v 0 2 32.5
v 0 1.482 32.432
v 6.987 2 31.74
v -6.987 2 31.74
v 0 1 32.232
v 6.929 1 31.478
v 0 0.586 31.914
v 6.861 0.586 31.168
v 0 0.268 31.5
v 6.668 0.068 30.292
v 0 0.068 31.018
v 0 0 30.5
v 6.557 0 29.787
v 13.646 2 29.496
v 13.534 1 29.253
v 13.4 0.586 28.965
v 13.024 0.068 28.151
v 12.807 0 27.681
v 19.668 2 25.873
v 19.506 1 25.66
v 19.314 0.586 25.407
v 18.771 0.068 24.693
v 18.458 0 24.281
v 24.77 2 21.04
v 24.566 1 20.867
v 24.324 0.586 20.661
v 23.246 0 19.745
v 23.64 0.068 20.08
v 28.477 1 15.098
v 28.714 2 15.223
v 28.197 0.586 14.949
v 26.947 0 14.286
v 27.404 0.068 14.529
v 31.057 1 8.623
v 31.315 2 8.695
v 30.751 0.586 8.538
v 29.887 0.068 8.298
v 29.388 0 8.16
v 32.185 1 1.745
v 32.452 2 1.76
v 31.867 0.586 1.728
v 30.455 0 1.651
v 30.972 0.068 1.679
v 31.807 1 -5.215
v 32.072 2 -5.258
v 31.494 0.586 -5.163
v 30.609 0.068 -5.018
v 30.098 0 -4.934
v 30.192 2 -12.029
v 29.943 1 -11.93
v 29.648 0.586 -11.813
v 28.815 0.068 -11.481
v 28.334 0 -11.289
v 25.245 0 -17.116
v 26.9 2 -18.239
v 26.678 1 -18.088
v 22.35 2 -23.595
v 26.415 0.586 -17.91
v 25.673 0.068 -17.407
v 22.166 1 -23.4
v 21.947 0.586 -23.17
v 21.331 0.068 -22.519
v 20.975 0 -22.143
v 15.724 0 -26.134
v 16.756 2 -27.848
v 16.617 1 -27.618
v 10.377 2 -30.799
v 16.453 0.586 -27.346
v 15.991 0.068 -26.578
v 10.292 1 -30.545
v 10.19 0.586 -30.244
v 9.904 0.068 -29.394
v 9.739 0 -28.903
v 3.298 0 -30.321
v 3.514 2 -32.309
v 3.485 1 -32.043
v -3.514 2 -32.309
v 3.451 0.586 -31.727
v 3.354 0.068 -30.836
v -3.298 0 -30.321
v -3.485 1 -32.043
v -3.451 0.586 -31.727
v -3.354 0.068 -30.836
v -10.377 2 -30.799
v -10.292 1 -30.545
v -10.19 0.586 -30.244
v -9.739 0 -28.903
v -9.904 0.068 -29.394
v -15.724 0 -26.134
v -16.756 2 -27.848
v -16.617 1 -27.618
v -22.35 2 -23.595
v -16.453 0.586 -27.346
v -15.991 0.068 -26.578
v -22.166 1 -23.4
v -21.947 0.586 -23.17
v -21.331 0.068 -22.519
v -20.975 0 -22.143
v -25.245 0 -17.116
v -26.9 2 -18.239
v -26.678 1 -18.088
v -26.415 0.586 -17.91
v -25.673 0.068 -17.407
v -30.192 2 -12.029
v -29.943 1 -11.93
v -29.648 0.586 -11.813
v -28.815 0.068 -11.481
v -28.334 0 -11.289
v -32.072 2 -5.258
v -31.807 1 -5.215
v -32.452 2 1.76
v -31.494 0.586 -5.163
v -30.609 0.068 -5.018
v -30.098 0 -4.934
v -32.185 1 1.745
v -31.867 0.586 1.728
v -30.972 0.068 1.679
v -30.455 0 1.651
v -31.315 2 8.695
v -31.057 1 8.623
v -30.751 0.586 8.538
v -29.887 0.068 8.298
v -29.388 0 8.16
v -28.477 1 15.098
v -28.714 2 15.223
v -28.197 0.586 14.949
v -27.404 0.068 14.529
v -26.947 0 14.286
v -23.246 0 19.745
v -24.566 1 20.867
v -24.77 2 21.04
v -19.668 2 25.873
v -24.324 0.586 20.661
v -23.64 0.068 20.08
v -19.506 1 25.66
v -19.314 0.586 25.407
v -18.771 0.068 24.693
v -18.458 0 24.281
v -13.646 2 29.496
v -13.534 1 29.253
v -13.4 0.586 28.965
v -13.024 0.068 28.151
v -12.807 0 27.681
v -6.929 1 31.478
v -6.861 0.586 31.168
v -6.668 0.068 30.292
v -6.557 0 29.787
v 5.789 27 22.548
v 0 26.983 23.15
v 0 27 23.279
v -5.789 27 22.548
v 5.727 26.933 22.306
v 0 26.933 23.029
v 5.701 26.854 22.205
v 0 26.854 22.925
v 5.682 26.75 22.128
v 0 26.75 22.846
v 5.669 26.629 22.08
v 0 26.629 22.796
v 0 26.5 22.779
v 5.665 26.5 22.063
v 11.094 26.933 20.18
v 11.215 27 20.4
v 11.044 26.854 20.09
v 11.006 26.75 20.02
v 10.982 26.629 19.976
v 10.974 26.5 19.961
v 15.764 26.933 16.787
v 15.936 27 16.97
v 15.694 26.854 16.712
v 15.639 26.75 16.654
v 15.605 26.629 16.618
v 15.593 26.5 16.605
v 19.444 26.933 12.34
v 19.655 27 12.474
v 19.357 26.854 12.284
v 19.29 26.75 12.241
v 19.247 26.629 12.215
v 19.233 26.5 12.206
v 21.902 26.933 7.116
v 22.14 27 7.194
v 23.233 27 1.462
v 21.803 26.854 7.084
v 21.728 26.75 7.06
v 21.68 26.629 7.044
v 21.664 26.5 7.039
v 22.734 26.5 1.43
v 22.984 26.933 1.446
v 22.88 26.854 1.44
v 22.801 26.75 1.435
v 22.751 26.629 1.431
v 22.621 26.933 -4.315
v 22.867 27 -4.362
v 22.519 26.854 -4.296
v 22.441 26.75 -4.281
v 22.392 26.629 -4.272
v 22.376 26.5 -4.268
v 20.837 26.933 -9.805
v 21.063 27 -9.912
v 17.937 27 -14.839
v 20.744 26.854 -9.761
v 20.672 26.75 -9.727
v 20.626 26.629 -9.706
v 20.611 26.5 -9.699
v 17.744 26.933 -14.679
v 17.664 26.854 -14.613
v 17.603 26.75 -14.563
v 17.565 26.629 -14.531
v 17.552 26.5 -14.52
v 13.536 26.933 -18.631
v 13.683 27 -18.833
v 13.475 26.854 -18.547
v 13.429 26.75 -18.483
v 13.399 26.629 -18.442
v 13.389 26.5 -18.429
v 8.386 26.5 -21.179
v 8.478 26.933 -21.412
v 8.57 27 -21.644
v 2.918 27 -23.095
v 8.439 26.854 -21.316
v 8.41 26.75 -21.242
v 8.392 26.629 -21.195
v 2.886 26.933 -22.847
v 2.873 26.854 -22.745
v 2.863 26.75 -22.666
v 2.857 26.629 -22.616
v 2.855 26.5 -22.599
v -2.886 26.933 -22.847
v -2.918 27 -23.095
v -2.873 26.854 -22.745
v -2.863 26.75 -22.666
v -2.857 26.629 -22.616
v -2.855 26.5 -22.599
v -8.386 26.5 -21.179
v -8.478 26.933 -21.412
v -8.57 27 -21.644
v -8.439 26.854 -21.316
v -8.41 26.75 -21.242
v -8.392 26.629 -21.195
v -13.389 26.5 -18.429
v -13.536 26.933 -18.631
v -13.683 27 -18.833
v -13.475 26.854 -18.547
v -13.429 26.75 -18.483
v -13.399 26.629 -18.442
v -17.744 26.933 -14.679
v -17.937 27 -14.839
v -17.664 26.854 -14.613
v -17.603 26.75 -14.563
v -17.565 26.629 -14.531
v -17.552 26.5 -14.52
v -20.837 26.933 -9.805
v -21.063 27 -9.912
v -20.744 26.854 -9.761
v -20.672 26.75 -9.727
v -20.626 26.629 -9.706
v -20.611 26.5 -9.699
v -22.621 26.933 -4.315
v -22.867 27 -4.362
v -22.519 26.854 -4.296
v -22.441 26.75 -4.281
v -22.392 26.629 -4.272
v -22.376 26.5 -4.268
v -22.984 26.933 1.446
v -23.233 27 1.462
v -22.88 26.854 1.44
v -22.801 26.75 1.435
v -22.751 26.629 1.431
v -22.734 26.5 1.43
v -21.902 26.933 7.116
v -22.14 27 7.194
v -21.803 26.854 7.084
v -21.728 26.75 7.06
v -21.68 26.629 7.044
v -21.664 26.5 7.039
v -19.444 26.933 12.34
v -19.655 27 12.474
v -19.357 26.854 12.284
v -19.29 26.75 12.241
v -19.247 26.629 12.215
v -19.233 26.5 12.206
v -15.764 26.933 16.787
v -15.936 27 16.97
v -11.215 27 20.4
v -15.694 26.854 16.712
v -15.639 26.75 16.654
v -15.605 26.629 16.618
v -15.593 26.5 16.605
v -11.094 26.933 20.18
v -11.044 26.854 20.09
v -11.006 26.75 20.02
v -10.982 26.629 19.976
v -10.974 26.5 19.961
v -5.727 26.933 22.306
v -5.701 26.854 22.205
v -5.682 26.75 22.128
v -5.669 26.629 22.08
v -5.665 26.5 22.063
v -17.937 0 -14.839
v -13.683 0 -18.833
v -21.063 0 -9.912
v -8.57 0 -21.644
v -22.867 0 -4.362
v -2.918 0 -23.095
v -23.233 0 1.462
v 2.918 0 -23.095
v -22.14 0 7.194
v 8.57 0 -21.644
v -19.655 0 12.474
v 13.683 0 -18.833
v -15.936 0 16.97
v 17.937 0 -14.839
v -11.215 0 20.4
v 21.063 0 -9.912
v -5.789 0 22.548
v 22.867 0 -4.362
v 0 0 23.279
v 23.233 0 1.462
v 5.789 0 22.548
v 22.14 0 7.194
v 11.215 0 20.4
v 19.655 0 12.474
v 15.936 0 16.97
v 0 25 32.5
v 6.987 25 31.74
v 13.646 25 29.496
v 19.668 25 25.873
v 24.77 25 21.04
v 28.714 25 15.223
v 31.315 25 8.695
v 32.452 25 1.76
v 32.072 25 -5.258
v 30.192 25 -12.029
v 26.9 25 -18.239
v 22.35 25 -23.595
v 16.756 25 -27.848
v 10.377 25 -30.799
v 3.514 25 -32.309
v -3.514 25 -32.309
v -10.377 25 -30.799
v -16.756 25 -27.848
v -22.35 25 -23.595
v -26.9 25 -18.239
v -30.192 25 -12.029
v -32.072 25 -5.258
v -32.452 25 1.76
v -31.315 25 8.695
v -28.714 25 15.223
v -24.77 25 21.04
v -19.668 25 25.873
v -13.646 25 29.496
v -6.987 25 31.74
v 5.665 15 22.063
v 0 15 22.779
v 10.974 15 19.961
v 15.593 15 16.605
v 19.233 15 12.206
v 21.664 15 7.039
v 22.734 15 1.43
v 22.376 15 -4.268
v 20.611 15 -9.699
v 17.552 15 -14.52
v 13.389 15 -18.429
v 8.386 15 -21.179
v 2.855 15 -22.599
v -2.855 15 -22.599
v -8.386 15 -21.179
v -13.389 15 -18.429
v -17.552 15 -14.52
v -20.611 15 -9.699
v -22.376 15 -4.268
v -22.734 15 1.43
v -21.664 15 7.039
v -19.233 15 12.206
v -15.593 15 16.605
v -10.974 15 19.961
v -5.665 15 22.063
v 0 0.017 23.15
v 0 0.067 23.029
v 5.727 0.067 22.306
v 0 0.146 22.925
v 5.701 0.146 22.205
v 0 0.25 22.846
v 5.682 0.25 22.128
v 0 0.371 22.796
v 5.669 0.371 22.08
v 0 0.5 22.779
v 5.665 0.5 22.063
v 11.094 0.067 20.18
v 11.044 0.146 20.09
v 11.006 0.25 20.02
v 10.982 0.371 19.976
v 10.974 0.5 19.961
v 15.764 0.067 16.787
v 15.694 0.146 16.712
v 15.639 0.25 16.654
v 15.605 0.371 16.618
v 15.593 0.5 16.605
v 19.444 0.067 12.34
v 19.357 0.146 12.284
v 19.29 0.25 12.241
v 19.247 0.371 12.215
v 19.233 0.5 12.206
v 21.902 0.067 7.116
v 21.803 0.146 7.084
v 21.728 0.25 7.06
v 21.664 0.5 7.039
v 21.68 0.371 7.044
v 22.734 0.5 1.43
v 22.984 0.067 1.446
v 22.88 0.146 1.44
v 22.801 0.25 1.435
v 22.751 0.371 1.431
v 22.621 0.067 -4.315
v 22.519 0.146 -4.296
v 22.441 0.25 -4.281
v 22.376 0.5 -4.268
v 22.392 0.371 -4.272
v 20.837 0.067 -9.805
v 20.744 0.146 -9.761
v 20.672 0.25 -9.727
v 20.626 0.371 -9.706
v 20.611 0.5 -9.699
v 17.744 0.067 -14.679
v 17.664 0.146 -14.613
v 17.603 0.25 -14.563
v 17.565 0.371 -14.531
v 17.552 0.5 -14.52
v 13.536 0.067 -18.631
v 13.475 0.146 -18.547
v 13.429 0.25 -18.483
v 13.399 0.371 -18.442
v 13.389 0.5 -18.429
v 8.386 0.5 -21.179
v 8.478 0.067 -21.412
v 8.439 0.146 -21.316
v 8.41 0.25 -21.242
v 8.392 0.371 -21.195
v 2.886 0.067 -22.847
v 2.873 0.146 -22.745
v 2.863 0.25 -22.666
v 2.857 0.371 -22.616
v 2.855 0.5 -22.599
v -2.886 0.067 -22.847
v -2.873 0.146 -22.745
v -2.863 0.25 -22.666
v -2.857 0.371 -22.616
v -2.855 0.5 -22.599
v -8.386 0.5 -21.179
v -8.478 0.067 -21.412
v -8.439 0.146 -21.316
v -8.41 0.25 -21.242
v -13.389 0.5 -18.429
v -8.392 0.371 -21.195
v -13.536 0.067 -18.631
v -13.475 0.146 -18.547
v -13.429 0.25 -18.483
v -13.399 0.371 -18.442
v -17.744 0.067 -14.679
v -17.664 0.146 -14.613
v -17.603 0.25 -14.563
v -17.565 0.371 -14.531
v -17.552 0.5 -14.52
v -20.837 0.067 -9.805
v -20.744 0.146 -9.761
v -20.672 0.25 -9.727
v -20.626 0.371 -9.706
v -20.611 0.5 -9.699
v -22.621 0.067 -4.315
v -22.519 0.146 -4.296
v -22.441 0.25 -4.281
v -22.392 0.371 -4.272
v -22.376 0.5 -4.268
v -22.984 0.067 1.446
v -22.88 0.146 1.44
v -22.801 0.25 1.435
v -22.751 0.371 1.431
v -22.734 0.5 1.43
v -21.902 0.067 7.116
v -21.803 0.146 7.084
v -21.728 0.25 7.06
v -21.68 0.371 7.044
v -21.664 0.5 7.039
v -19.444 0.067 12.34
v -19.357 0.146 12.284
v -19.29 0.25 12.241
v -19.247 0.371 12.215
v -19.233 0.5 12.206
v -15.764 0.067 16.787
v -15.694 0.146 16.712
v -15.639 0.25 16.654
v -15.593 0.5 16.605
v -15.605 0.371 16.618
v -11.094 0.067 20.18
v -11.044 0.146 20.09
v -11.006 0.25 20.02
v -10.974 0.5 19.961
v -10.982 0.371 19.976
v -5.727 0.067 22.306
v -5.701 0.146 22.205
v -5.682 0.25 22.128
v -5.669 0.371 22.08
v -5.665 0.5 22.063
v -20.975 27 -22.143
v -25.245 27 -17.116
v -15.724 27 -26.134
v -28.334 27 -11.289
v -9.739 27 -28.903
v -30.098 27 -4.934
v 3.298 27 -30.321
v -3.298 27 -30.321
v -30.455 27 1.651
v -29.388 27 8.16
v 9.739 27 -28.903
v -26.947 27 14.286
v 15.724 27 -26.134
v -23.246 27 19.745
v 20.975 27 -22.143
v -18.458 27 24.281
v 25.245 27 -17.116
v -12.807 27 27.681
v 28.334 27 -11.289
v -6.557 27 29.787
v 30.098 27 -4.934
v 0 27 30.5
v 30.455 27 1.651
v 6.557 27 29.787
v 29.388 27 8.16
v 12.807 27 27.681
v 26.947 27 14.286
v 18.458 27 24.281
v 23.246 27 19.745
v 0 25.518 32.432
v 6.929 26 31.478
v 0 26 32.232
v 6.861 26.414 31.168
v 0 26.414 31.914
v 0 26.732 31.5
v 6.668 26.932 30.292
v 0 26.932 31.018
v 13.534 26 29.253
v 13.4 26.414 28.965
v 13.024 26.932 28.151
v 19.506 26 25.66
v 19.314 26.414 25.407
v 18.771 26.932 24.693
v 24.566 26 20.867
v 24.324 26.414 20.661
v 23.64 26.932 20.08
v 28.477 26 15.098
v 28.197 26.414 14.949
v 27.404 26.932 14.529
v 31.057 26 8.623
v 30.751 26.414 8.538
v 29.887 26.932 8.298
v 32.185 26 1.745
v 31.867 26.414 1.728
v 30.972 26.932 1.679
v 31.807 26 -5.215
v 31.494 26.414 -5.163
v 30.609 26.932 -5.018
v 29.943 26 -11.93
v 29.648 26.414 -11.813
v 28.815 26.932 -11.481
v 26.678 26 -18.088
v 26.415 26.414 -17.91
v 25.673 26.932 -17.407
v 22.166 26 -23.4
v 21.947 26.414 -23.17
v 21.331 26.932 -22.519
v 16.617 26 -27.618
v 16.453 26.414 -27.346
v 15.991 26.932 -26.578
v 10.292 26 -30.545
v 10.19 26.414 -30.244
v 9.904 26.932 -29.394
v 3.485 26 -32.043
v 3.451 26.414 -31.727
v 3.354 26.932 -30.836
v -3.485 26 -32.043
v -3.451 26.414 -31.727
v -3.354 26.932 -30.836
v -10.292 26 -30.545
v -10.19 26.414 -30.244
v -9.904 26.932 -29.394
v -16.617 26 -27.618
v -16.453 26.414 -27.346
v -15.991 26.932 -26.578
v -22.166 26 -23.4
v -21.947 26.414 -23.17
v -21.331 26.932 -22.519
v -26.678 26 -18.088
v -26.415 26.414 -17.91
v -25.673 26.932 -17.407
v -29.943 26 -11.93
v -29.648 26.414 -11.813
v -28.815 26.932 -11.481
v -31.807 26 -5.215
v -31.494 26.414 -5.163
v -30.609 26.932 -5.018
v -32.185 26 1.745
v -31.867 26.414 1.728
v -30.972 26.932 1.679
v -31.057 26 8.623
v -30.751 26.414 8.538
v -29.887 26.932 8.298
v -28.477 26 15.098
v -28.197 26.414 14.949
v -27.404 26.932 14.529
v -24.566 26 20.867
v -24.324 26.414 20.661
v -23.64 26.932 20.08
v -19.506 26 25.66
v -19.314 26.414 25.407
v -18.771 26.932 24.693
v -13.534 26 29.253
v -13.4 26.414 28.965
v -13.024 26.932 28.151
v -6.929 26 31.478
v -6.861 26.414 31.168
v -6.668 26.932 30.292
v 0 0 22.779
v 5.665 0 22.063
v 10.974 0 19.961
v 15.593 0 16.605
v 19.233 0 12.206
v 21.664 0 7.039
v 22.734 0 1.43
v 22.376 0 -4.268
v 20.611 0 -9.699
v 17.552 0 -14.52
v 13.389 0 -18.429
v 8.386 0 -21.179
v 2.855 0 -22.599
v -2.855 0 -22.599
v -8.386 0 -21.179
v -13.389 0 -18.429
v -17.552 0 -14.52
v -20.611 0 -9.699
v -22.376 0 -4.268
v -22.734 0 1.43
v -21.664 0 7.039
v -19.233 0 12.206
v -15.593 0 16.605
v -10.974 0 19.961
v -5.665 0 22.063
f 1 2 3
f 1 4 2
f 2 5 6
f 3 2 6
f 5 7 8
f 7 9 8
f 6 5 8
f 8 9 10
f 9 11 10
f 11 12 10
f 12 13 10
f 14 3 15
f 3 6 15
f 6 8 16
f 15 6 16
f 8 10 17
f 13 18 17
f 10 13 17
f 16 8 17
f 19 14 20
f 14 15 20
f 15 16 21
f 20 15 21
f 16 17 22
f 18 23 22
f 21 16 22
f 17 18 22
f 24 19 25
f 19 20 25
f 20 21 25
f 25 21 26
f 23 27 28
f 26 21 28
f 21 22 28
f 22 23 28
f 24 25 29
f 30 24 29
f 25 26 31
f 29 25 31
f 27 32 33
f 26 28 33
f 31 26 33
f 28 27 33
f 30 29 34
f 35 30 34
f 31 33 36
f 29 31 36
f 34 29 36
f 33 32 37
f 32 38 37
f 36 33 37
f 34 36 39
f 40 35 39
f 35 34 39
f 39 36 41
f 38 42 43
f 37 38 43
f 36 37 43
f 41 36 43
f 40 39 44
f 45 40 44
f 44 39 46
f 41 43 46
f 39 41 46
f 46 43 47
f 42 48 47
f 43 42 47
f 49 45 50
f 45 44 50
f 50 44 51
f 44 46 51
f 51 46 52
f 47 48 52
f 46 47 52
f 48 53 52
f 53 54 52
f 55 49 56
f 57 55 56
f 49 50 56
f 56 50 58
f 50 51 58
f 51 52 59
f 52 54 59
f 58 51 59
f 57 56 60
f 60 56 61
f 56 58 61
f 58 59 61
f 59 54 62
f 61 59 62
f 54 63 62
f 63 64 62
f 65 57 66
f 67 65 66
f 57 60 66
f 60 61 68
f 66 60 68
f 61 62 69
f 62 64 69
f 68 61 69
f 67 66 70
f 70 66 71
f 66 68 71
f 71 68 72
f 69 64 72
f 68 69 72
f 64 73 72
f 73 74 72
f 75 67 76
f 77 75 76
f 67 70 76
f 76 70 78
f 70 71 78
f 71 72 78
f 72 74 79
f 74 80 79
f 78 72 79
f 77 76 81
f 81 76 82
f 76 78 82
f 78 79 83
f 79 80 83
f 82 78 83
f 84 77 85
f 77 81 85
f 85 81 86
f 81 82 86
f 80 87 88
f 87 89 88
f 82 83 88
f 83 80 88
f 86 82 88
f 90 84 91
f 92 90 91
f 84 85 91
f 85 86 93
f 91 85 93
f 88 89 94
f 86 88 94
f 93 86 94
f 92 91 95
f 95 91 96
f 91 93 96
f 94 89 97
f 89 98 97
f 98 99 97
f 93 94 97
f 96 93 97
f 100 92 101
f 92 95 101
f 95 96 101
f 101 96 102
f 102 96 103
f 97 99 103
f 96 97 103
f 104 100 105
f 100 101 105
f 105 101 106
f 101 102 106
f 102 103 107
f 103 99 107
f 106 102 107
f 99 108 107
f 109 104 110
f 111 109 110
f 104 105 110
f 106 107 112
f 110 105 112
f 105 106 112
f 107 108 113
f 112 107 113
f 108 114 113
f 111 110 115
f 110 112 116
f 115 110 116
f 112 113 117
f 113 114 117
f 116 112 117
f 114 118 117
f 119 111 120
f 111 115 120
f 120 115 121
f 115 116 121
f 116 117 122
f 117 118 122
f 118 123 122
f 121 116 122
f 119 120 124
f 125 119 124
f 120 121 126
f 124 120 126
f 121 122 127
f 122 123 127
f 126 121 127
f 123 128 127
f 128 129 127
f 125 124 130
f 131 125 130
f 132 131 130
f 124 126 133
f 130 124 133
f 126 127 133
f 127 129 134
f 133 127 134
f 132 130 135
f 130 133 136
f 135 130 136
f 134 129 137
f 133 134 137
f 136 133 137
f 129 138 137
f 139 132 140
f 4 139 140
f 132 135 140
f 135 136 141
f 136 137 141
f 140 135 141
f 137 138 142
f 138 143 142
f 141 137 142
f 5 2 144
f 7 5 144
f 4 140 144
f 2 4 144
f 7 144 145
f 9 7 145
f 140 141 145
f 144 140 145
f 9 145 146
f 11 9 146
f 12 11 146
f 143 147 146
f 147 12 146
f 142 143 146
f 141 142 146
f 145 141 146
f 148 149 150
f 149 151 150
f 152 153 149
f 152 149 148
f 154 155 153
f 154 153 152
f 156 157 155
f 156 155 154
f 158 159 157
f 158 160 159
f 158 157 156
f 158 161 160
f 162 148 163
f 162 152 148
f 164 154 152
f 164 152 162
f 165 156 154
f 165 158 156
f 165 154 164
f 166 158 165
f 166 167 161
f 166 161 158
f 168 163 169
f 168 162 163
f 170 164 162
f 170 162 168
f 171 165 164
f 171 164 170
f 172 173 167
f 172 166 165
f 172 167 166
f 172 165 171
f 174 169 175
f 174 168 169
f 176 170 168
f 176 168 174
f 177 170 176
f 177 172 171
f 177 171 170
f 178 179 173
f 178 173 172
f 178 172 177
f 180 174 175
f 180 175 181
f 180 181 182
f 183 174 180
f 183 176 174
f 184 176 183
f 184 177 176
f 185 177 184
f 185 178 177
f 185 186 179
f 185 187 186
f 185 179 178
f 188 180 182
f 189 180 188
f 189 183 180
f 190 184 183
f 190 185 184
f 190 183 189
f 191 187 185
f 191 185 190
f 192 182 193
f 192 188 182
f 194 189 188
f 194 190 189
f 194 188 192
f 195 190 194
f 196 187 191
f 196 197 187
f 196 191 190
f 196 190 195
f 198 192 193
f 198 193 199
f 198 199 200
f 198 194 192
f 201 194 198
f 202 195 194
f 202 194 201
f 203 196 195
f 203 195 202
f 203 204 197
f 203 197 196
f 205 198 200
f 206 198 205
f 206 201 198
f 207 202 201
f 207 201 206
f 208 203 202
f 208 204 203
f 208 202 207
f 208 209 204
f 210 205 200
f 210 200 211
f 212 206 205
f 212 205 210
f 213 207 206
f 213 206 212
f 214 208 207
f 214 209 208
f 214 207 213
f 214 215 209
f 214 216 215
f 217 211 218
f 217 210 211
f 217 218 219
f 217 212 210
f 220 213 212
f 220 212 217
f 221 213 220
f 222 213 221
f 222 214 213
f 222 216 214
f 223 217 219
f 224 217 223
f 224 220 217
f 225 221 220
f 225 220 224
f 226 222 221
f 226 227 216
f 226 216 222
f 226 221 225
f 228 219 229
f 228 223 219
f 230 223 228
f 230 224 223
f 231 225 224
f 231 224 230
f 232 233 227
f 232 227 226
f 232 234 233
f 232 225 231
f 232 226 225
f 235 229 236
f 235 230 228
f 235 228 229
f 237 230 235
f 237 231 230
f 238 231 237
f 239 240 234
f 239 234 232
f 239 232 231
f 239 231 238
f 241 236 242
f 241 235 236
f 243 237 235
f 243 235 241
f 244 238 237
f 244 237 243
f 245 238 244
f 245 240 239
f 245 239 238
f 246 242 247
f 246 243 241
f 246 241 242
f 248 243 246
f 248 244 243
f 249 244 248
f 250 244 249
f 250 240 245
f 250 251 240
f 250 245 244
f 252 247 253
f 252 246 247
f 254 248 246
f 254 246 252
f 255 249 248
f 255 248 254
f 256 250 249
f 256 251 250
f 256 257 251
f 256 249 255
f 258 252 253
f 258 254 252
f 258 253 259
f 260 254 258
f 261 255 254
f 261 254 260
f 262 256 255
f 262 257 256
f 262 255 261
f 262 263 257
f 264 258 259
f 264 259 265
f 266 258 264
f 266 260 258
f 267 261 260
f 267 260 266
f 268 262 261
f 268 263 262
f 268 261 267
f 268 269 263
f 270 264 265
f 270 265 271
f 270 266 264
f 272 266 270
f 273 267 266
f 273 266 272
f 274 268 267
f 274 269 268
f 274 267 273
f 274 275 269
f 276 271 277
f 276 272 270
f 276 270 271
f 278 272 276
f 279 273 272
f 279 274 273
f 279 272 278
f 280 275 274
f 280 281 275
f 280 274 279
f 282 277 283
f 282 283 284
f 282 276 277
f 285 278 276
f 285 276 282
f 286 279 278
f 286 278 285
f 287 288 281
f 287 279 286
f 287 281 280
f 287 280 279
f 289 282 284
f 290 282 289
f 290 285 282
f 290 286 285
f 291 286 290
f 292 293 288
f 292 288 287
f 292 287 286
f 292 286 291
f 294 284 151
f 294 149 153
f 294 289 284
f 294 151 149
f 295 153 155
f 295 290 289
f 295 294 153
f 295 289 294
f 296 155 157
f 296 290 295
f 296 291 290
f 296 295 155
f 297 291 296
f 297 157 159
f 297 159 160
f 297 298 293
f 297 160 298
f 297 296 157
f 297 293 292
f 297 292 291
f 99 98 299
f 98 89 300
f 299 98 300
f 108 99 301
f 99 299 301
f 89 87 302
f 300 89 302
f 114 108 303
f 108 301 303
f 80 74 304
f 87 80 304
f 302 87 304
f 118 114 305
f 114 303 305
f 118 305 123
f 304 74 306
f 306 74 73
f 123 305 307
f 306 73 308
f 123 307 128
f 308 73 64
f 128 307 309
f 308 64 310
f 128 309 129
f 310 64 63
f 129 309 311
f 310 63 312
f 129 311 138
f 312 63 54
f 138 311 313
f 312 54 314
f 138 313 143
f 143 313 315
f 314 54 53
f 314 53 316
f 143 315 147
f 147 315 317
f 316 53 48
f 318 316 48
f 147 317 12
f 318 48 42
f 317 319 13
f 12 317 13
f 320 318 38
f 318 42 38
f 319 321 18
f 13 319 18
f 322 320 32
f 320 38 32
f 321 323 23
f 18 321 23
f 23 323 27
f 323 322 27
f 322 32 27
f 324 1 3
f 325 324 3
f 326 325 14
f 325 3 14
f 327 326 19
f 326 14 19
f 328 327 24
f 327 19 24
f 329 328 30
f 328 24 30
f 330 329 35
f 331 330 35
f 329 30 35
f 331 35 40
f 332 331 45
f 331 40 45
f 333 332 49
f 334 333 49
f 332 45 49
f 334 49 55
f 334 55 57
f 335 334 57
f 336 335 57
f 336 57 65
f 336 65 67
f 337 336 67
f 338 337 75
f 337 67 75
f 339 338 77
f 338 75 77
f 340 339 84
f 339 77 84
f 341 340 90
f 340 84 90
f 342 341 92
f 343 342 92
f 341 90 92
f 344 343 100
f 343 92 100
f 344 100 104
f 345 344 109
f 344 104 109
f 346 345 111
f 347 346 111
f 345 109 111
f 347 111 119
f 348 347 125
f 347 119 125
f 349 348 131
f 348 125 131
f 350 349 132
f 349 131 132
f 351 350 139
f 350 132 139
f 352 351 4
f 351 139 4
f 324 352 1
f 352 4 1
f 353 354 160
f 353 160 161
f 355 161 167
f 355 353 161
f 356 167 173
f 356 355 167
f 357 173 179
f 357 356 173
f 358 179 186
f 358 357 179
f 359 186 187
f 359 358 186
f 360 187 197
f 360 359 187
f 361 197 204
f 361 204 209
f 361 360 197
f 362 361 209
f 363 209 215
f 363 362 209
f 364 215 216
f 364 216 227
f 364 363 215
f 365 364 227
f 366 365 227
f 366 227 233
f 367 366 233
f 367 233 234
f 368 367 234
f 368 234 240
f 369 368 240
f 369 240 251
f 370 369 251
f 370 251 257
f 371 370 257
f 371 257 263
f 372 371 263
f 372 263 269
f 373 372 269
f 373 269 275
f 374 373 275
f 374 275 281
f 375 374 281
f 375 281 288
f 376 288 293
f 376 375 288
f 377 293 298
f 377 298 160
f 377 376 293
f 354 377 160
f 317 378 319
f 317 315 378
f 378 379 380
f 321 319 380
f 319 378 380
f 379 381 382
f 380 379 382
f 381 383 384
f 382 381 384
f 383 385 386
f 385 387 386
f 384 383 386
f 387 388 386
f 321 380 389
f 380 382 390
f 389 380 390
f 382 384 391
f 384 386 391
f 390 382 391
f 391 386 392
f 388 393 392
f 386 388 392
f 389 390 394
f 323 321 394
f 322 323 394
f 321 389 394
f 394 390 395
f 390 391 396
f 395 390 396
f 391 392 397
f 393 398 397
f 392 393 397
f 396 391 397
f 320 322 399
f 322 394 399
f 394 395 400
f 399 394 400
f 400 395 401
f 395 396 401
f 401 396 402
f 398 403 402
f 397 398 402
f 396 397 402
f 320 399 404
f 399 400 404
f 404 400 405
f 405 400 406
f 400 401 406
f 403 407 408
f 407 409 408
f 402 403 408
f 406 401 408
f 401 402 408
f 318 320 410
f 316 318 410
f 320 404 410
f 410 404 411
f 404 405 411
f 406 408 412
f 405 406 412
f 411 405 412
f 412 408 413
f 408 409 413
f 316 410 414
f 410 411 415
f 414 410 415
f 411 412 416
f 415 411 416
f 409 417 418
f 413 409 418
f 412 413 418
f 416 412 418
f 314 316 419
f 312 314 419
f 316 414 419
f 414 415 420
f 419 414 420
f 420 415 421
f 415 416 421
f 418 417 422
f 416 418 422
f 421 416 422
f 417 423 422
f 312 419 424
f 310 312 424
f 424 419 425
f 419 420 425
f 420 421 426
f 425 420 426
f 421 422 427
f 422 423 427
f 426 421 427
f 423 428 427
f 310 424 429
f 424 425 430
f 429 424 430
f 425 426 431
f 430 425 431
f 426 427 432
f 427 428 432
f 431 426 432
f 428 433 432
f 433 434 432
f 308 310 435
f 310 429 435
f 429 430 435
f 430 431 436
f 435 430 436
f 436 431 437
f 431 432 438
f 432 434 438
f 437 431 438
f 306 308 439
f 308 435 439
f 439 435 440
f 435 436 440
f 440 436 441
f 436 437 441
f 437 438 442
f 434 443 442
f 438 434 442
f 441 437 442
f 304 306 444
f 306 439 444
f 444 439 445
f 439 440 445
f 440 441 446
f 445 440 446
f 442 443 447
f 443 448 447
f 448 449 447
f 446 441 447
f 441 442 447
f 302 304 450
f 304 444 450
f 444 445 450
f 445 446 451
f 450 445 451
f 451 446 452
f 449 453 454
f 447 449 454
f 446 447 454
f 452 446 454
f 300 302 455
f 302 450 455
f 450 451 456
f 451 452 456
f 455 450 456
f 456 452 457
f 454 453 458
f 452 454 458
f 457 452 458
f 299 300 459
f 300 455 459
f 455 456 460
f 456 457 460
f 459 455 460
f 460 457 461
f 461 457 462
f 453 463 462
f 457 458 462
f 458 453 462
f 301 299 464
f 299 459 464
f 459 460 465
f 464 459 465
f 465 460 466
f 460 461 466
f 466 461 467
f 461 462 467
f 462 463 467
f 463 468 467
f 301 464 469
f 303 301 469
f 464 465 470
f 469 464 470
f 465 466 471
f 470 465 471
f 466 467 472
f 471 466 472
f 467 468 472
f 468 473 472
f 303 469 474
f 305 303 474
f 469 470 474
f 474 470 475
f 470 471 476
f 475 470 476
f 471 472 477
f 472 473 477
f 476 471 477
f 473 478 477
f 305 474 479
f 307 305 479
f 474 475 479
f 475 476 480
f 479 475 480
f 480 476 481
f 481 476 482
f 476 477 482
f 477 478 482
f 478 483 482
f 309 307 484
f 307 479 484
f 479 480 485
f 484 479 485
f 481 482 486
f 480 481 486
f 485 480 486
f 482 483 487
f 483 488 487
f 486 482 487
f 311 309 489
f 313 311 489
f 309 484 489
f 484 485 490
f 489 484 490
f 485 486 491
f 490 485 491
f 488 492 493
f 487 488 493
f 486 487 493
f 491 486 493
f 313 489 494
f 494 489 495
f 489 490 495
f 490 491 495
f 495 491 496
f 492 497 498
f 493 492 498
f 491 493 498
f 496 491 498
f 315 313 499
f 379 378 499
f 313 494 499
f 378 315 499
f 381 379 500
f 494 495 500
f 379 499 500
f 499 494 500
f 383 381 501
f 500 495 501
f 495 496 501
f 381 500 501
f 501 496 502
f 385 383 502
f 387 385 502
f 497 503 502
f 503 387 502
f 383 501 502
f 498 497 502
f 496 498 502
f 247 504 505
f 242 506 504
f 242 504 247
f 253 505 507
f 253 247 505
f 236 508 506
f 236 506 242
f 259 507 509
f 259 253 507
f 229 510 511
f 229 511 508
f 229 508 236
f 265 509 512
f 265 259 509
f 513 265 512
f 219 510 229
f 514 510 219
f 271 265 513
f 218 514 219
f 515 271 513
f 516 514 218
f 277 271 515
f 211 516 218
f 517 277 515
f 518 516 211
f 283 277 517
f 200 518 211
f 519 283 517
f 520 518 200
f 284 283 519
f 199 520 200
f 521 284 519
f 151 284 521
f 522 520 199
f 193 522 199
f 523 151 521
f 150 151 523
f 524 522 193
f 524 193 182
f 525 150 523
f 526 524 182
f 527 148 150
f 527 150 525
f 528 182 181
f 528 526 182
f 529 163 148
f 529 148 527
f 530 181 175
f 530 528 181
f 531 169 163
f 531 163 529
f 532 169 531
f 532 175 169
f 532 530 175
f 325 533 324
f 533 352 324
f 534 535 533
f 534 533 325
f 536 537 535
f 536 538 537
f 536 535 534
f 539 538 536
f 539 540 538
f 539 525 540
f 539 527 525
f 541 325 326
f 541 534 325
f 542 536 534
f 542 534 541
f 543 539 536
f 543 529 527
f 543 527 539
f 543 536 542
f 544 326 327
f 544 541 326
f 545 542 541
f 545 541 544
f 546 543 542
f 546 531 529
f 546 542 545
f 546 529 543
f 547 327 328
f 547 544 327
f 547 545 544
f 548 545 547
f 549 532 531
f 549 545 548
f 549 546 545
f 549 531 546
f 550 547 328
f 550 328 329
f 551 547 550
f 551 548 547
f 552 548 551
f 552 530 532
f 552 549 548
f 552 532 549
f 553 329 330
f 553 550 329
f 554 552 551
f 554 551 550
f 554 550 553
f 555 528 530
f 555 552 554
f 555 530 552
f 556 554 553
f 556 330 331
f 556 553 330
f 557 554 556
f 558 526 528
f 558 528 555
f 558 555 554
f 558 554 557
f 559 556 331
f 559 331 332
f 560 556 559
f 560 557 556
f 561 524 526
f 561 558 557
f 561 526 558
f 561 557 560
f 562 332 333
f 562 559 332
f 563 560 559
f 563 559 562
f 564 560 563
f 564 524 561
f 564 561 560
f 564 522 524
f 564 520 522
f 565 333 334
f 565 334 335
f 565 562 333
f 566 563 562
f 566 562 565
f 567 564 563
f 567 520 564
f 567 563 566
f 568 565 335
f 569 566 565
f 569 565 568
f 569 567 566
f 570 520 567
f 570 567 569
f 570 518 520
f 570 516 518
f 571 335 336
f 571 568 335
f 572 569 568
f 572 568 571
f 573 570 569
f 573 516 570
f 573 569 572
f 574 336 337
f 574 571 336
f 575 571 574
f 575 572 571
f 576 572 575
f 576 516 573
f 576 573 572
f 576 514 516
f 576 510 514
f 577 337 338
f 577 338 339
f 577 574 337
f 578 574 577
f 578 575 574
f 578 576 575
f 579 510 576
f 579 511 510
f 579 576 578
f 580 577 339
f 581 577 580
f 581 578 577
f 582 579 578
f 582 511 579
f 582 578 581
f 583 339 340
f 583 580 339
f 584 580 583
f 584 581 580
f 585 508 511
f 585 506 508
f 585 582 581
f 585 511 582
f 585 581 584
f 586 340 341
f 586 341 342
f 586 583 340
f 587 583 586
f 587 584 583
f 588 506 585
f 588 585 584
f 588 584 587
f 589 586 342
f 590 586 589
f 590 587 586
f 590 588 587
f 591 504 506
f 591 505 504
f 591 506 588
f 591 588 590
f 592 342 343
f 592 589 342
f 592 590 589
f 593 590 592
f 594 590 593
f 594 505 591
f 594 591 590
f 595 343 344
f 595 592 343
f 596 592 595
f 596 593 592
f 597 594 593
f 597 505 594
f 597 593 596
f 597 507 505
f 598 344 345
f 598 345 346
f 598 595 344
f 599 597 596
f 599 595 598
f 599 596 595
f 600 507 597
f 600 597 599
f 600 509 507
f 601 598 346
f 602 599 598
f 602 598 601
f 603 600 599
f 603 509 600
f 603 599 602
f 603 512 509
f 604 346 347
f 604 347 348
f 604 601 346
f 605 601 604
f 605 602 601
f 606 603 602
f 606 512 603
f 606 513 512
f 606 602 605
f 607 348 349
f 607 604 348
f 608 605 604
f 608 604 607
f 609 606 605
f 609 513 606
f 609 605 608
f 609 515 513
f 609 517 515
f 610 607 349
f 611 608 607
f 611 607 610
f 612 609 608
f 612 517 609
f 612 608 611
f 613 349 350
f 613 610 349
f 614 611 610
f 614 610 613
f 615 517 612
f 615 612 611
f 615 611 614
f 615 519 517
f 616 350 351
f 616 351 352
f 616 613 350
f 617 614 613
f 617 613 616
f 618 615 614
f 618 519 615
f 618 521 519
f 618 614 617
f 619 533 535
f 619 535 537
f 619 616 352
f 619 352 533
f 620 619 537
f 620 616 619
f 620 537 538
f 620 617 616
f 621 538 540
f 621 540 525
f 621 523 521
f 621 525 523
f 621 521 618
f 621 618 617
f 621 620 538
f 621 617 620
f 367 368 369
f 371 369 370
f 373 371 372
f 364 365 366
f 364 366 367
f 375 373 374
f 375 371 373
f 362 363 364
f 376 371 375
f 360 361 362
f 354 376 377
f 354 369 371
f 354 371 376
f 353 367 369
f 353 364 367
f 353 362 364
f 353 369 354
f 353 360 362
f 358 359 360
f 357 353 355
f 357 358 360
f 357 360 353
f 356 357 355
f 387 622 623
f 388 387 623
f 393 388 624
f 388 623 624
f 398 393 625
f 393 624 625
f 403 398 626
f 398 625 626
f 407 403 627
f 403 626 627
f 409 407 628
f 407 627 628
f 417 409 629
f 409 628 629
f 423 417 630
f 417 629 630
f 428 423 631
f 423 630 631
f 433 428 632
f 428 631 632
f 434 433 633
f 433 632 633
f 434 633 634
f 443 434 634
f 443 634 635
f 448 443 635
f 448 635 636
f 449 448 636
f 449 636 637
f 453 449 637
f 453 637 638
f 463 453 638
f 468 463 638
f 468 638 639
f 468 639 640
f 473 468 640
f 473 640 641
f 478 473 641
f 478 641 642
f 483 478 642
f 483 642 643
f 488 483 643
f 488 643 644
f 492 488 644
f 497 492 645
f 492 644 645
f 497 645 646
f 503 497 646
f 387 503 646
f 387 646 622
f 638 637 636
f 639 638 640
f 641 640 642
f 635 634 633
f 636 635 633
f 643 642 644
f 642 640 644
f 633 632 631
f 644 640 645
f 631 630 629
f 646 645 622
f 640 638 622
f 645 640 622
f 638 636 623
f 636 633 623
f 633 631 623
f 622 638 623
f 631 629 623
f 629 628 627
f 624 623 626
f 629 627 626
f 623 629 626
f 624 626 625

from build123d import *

# Parameters (mm, degrees)
SKETCH_1_R      = 32.5
SKETCH_1_R_2    = 22.779013497
EXTRUDE_1_DEPTH = 27
FILLET_1_R      = 2
FILLET_2_R      = 0.5
SKETCH_1_3_R    = 22.779013497
EXTRUDE_2_DEPTH = 15


with BuildPart() as part:
    # 草图1 → 凸台-拉伸1 (new body)
    with BuildSketch(Plane(origin=(0, 0, 0), x_dir=(1, 0, 0), z_dir=(0, 1, 0))):
        Circle(SKETCH_1_R)
        Circle(SKETCH_1_R_2, mode=Mode.SUBTRACT)
    extrude(amount=EXTRUDE_1_DEPTH)

    # 圆角1
    fillet_1_edges = [part.edges().sort_by_distance(p)[0] for p in [
        (-32.5, 27, 0),
        (-32.5, 0, 0),
    ]]
    fillet(fillet_1_edges, radius=FILLET_1_R)

    # 圆角2
    fillet_2_edges = [part.edges().sort_by_distance(p)[0] for p in [
        (-22.779013497, 27, 0),
        (-22.779013497, 0, 0),
    ]]
    fillet(fillet_2_edges, radius=FILLET_2_R)

    # 草图1<3> → 凸台-拉伸2 (add)
    with BuildSketch(Plane(origin=(0, 0, 0), x_dir=(1, 0, 0), z_dir=(0, 1, 0))):
        Circle(SKETCH_1_3_R)
    extrude(amount=EXTRUDE_2_DEPTH)


solid = part.part
